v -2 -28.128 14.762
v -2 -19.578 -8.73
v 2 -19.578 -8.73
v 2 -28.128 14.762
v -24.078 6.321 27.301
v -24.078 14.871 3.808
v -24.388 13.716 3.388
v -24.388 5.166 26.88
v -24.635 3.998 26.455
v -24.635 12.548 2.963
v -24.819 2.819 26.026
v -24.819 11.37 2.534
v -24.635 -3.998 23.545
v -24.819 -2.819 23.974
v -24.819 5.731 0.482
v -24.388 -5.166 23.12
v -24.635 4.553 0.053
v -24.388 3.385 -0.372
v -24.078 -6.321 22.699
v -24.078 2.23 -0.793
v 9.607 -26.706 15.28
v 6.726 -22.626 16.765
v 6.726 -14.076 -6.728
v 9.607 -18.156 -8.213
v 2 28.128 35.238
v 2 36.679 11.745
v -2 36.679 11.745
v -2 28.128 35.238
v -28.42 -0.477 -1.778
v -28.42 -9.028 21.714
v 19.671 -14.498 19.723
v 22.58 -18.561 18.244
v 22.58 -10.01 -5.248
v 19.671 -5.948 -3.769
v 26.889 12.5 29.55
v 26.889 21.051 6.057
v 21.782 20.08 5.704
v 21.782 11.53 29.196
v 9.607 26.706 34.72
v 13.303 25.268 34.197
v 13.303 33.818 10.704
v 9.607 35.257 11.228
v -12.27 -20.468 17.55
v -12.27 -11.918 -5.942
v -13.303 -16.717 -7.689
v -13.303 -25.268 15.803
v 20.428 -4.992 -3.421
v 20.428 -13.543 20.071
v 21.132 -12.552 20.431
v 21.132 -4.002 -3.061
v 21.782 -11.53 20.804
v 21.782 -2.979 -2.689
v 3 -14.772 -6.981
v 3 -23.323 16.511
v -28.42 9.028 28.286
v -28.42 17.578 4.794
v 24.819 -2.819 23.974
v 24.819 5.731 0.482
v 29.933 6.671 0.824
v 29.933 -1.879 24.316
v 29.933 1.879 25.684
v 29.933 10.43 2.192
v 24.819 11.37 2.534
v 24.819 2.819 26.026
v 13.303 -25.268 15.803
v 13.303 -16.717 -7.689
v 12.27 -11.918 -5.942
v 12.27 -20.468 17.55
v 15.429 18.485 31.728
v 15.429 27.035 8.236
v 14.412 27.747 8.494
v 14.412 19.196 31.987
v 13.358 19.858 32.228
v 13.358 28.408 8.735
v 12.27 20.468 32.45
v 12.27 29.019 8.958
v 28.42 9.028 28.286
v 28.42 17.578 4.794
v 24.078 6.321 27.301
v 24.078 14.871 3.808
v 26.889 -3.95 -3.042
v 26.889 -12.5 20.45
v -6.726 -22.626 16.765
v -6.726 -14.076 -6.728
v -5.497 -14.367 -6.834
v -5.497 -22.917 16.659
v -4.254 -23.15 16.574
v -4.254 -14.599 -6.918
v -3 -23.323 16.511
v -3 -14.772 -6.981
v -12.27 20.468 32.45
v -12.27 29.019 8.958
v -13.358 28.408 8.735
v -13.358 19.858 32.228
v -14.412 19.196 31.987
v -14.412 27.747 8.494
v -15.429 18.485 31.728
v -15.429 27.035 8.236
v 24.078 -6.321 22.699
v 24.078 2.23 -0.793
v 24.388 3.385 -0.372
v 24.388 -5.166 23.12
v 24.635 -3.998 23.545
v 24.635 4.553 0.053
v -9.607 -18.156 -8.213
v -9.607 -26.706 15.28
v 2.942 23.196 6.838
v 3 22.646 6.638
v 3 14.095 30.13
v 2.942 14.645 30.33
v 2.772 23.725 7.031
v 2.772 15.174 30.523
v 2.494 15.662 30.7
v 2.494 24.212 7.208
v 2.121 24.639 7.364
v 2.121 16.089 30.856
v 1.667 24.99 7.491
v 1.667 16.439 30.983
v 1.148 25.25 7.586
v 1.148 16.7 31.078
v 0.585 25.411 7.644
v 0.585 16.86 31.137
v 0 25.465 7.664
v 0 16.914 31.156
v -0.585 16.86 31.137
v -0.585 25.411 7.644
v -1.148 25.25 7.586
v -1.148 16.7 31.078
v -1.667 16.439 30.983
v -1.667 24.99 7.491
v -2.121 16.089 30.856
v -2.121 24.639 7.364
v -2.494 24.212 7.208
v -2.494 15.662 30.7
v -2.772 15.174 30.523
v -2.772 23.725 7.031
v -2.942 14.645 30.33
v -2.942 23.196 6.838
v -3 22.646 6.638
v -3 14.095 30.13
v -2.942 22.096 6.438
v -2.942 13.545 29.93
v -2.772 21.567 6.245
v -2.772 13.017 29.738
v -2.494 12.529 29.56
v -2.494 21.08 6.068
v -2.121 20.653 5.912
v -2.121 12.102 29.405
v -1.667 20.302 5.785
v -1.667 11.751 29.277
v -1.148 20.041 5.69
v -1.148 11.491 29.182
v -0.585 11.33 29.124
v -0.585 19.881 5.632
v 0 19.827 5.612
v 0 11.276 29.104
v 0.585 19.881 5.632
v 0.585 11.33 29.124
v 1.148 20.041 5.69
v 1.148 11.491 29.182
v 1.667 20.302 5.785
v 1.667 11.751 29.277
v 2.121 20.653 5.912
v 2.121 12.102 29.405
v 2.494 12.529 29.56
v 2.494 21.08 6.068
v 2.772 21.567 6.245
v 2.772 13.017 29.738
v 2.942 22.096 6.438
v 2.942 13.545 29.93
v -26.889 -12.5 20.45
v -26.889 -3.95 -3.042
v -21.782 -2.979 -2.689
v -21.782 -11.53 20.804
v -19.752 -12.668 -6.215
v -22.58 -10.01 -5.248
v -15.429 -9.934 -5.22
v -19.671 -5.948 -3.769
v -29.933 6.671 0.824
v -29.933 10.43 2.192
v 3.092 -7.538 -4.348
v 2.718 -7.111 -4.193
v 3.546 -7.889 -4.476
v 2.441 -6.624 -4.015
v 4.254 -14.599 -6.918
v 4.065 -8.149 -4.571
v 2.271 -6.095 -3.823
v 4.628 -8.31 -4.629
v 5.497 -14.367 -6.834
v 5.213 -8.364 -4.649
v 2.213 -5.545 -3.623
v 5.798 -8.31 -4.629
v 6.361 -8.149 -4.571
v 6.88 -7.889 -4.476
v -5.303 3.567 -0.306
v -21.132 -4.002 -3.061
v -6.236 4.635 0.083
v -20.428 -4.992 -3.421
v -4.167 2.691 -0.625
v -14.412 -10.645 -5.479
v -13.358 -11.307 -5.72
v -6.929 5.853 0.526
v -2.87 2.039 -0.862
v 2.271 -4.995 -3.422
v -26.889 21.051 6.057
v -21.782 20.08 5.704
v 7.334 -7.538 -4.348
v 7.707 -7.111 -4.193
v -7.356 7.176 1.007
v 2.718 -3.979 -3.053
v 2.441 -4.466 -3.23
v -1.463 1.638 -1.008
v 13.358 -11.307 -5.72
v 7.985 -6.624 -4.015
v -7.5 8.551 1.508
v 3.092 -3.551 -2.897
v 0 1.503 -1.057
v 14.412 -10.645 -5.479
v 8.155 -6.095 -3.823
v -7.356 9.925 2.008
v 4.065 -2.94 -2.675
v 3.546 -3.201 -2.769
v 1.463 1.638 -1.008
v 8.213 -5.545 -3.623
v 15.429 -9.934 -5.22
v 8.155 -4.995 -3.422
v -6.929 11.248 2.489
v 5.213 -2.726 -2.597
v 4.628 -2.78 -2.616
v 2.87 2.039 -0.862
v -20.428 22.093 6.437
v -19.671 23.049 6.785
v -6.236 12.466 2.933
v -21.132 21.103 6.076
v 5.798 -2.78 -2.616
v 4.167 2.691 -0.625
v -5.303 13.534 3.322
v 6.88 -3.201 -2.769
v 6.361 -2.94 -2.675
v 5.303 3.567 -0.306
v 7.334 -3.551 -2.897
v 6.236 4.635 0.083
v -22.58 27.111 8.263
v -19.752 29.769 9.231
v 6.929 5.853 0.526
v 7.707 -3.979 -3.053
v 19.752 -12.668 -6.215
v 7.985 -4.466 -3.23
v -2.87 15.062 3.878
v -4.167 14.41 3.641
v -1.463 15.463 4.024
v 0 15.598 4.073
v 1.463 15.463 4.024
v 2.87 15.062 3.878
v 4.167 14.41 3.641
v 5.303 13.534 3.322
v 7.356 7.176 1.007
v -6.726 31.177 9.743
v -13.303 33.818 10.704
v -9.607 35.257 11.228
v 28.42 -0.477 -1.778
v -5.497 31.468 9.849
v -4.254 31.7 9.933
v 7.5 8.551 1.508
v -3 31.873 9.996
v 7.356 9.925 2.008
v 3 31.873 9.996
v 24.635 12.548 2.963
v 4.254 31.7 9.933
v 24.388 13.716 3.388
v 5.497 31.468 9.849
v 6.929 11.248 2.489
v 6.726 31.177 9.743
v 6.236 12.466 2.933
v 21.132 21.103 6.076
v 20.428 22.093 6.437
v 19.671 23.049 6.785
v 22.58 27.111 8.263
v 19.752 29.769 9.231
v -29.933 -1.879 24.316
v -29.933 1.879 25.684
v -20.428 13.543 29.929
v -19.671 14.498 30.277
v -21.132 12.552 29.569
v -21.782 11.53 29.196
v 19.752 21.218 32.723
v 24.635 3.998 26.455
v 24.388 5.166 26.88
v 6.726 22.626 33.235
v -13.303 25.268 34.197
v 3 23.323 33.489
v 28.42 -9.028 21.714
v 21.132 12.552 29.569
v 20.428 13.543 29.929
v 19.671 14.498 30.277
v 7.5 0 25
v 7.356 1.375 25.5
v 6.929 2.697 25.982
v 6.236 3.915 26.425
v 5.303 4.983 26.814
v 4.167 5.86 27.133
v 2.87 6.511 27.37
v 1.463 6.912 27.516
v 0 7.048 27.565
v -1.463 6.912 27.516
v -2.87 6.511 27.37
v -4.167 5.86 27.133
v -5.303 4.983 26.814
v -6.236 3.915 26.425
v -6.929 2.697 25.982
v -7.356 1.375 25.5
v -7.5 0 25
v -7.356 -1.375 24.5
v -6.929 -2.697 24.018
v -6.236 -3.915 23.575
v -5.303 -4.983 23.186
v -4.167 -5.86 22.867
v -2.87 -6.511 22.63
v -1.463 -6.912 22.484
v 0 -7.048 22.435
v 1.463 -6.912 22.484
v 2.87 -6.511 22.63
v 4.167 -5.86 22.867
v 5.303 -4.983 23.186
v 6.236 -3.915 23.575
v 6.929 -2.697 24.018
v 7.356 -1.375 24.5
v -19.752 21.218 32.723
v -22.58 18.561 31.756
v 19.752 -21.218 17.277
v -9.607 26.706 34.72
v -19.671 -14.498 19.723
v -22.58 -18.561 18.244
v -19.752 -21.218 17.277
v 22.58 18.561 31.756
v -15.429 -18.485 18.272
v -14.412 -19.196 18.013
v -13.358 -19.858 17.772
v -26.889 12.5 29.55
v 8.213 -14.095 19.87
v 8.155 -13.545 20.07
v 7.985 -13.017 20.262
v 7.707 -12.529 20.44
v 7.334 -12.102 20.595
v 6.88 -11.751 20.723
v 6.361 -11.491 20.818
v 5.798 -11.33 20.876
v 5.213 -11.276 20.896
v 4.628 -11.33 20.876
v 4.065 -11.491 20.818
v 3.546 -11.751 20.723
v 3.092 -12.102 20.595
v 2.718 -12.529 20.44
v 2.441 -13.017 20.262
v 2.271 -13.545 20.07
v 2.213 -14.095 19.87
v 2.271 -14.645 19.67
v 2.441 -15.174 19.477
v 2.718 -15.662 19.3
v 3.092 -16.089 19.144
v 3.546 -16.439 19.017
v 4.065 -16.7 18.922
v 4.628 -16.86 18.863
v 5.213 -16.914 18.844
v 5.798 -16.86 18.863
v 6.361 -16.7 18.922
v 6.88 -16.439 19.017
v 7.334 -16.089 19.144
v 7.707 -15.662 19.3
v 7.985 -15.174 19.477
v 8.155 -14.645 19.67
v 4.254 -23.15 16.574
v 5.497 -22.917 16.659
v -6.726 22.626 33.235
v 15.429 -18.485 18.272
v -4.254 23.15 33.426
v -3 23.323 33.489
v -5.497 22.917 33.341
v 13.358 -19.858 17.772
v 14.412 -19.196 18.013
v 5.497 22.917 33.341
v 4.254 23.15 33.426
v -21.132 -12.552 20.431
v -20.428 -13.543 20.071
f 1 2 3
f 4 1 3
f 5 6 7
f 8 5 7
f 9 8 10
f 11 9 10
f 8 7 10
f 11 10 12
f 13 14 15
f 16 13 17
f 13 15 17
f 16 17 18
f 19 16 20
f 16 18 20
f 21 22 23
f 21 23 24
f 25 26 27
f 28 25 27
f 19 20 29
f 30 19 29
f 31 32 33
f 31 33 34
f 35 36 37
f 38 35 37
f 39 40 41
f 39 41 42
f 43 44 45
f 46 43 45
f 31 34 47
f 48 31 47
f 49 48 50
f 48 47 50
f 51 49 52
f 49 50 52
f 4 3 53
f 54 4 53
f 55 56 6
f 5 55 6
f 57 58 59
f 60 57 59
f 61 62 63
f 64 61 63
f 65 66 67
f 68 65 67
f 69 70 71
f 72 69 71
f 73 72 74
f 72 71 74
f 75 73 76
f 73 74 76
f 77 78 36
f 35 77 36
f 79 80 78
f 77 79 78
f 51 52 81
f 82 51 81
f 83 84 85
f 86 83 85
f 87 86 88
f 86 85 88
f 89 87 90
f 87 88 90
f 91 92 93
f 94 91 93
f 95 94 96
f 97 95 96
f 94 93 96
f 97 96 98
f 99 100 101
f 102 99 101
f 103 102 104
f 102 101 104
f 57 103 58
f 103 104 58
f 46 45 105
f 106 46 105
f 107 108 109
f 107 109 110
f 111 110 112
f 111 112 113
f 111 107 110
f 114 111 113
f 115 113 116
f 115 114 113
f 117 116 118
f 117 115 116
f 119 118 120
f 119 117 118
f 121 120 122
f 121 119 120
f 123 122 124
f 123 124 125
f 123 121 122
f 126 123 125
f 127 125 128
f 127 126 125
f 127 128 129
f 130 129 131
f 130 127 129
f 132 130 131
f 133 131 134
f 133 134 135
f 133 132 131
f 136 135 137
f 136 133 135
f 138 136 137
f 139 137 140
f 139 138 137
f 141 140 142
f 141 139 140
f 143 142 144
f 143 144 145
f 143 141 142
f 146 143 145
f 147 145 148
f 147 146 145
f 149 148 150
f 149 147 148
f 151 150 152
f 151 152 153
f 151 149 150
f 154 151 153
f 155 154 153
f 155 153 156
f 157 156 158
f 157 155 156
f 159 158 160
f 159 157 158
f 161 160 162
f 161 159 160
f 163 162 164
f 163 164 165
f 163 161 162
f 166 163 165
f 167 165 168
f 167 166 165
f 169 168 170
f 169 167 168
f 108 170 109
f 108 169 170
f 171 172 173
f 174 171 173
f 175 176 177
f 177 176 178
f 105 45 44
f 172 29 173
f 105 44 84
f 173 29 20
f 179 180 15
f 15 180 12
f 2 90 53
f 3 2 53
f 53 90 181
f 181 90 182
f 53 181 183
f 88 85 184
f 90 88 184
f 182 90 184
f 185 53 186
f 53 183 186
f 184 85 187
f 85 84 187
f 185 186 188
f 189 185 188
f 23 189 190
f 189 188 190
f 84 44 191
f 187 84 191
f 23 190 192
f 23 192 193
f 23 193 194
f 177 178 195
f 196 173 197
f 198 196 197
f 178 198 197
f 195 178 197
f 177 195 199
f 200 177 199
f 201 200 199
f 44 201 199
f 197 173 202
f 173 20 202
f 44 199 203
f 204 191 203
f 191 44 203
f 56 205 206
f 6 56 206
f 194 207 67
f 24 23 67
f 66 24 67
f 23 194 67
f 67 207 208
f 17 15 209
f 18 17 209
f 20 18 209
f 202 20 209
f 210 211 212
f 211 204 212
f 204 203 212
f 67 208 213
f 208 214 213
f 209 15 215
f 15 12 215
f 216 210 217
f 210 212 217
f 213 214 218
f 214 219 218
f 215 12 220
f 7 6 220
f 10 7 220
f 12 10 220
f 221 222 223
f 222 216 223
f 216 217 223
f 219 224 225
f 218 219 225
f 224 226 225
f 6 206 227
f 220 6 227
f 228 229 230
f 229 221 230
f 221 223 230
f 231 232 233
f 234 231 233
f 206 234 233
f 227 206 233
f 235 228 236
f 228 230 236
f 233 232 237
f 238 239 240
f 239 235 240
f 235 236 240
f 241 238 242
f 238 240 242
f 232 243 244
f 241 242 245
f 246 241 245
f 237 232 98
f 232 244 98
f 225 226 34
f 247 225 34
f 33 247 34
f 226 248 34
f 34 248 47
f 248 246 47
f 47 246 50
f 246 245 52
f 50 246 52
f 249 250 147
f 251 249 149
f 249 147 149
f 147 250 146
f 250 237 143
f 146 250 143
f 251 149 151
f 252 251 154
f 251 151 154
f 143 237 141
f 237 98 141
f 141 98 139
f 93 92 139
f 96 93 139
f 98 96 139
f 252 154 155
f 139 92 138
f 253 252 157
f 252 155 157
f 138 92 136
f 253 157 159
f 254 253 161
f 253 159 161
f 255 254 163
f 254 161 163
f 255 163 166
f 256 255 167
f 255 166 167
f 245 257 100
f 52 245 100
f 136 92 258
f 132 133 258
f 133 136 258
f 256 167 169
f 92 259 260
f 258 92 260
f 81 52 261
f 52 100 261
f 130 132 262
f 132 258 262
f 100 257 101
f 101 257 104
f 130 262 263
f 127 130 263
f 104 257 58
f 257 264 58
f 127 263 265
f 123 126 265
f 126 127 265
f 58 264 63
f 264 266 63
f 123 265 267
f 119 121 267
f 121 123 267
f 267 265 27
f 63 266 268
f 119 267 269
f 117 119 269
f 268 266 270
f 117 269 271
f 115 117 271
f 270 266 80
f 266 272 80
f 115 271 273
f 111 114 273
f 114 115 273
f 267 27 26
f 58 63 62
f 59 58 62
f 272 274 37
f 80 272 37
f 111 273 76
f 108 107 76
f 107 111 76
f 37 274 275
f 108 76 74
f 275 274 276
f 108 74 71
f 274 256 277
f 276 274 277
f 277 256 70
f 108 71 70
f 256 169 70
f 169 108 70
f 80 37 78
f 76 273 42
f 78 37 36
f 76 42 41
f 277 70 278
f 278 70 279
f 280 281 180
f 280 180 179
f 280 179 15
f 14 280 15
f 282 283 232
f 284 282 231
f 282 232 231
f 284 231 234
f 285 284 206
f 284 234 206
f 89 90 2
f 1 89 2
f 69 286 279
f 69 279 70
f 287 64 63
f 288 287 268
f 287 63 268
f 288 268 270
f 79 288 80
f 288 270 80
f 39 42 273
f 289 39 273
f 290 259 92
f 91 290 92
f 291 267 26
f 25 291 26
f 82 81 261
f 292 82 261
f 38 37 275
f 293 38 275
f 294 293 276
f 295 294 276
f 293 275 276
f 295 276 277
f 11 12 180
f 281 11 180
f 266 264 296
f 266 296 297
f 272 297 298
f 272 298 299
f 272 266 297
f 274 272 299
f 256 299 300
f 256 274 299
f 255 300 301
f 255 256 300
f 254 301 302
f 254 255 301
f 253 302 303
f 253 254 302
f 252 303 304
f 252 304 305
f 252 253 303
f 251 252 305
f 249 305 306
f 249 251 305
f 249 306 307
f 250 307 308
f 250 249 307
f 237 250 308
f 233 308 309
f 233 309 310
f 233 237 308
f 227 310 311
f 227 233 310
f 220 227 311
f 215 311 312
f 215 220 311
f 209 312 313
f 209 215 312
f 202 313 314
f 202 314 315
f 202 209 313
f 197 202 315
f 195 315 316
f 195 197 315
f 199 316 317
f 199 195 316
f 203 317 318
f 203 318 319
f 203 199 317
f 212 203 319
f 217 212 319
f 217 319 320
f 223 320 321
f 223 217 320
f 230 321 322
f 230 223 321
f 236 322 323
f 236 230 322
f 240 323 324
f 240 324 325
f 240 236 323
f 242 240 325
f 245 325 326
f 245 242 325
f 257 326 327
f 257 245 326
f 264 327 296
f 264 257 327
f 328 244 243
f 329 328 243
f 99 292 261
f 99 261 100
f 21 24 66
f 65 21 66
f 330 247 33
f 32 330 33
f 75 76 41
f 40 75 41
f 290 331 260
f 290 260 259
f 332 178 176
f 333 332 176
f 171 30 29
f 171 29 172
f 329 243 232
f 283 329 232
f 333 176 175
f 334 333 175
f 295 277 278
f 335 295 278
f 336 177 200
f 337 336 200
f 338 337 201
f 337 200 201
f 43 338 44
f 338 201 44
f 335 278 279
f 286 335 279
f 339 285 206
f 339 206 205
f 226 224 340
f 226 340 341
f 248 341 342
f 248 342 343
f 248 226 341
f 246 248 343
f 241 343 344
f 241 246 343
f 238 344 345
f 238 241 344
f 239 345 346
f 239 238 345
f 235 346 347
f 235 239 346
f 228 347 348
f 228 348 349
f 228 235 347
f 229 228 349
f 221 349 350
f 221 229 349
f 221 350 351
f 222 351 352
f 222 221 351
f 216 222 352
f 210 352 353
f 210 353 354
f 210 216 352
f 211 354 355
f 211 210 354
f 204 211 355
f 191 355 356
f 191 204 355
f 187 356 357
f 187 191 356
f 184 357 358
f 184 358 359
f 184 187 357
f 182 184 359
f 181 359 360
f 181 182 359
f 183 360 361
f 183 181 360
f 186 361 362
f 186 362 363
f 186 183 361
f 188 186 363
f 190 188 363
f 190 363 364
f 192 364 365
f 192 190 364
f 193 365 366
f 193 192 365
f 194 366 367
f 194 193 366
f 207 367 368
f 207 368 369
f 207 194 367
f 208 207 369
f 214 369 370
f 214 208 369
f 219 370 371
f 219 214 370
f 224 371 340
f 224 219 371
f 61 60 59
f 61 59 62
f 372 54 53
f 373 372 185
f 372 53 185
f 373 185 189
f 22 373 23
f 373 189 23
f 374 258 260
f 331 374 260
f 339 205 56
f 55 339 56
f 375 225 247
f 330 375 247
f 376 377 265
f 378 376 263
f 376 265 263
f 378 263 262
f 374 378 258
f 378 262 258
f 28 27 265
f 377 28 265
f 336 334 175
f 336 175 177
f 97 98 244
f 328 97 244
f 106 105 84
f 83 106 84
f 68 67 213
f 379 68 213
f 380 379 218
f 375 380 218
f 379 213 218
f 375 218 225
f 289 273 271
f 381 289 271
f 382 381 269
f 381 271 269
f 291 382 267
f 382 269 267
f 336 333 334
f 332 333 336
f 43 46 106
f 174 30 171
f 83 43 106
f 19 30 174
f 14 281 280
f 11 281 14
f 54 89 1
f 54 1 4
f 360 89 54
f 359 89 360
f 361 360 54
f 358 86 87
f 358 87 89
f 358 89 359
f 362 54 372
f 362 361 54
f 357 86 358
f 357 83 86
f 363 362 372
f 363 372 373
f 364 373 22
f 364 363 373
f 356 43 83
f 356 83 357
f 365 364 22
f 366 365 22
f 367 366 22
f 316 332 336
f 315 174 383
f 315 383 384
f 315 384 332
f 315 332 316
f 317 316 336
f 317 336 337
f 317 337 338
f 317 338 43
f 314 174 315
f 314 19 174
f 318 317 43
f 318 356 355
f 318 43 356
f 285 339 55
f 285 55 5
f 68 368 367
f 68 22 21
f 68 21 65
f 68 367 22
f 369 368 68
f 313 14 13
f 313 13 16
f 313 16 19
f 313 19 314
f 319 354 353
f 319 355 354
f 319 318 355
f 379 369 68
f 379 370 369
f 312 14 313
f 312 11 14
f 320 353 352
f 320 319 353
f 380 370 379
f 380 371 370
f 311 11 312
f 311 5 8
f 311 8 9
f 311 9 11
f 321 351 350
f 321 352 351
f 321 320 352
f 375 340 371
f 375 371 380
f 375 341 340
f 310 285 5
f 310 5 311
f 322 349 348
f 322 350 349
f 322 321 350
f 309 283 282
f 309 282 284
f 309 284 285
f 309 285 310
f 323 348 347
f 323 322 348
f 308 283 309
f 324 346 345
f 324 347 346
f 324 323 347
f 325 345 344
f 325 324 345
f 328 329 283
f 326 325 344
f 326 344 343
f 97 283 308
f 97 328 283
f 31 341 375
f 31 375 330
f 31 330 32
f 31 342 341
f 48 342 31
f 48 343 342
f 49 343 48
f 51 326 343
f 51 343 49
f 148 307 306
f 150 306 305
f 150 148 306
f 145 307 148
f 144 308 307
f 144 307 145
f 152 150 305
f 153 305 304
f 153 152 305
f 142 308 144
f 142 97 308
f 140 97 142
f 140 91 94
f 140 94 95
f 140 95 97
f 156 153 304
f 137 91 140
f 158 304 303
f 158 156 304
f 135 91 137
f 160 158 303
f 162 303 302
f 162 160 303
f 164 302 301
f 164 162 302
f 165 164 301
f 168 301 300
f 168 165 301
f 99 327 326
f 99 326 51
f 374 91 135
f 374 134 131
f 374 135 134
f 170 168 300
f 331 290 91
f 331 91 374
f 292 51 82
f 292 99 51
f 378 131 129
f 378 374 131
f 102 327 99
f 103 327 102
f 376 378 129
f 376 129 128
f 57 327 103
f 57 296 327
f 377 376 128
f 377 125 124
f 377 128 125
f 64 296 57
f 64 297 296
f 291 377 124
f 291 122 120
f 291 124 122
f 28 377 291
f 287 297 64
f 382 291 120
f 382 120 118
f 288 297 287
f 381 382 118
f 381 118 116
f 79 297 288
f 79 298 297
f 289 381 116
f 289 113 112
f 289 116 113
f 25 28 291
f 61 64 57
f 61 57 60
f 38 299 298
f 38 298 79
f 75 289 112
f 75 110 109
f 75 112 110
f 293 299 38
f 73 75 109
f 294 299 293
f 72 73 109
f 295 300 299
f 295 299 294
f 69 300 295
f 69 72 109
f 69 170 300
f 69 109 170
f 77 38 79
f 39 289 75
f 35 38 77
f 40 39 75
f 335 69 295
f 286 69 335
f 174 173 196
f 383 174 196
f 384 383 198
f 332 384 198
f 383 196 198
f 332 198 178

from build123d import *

# Parameters (mm, degrees)
F0_R     = 3
F0_R_2   = 7.5
F1_DEPTH = 25
F3_ANGLE = 20


with BuildPart() as f1:
    # F0 (on Top) → F1 (new body)
    with BuildSketch(Plane.XY):
        with BuildLine():
            Line((3, 24.819347), (2, 29.933259))
            Line((2, 29.933259), (-2, 29.933259))
            Line((-2, 29.933259), (-3, 24.819347))
            ThreePointArc((-3, 24.819347), (-4.877258, 24.519632), (-6.726314, 24.078137))
            Line((-6.726314, 24.078137), (-9.607203, 28.420092))
            Line((-9.607203, 28.420092), (-13.302721, 26.889359))
            Line((-13.302721, 26.889359), (-12.269592, 21.782037))
            ThreePointArc((-12.269592, 21.782037), (-13.889256, 20.78674), (-15.428608, 19.671249))
            Line((-15.428608, 19.671249), (-19.751797, 22.580224))
            Line((-19.751797, 22.580224), (-22.580224, 19.751797))
            Line((-22.580224, 19.751797), (-19.671249, 15.428609))
            ThreePointArc((-19.671249, 15.428609), (-20.78674, 13.889256), (-21.782037, 12.269592))
            Line((-21.782037, 12.269592), (-26.889359, 13.302722))
            Line((-26.889359, 13.302722), (-28.420092, 9.607203))
            Line((-28.420092, 9.607203), (-24.078137, 6.726315))
            ThreePointArc((-24.078137, 6.726315), (-24.519632, 4.877258), (-24.819347, 3))
            Line((-24.819347, 3), (-29.933259, 2))
            Line((-29.933259, 2), (-29.933259, -2))
            Line((-29.933259, -2), (-24.819347, -3))
            ThreePointArc((-24.819347, -3), (-24.519632, -4.877258), (-24.078137, -6.726314))
            Line((-24.078137, -6.726314), (-28.420092, -9.607203))
            Line((-28.420092, -9.607203), (-26.889359, -13.302721))
            Line((-26.889359, -13.302721), (-21.782037, -12.269592))
            ThreePointArc((-21.782037, -12.269592), (-20.78674, -13.889256), (-19.671249, -15.428608))
            Line((-19.671249, -15.428608), (-22.580224, -19.751797))
            Line((-22.580224, -19.751797), (-19.751797, -22.580224))
            Line((-19.751797, -22.580224), (-15.428608, -19.671249))
            ThreePointArc((-15.428608, -19.671249), (-13.889256, -20.78674), (-12.269592, -21.782037))
            Line((-12.269592, -21.782037), (-13.302721, -26.889359))
            Line((-13.302721, -26.889359), (-9.607203, -28.420092))
            Line((-9.607203, -28.420092), (-6.726314, -24.078137))
            ThreePointArc((-6.726314, -24.078137), (-4.877258, -24.519632), (-3, -24.819347))
            Line((-3, -24.819347), (-2, -29.933259))
            Line((-2, -29.933259), (2, -29.933259))
            Line((2, -29.933259), (3, -24.819347))
            ThreePointArc((3, -24.819347), (4.877258, -24.519632), (6.726314, -24.078137))
            Line((6.726314, -24.078137), (9.607203, -28.420092))
            Line((9.607203, -28.420092), (13.302721, -26.889359))
            Line((13.302721, -26.889359), (12.269592, -21.782037))
            ThreePointArc((12.269592, -21.782037), (13.889256, -20.78674), (15.428608, -19.671249))
            Line((15.428608, -19.671249), (19.751797, -22.580224))
            Line((19.751797, -22.580224), (22.580224, -19.751797))
            Line((22.580224, -19.751797), (19.671249, -15.428608))
            ThreePointArc((19.671249, -15.428608), (20.78674, -13.889256), (21.782037, -12.269592))
            Line((21.782037, -12.269592), (26.889359, -13.302721))
            Line((26.889359, -13.302721), (28.420092, -9.607203))
            Line((28.420092, -9.607203), (24.078137, -6.726314))
            ThreePointArc((24.078137, -6.726314), (24.519632, -4.877258), (24.819347, -3))
            Line((24.819347, -3), (29.933259, -2))
            Line((29.933259, -2), (29.933259, 2))
            Line((29.933259, 2), (24.819347, 3))
            ThreePointArc((24.819347, 3), (24.519632, 4.877258), (24.078137, 6.726314))
            Line((24.078137, 6.726314), (28.420092, 9.607203))
            Line((28.420092, 9.607203), (26.889359, 13.302721))
            Line((26.889359, 13.302721), (21.782037, 12.269592))
            ThreePointArc((21.782037, 12.269592), (20.78674, 13.889256), (19.671249, 15.428608))
            Line((19.671249, 15.428608), (22.580224, 19.751797))
            Line((22.580224, 19.751797), (19.751797, 22.580224))
            Line((19.751797, 22.580224), (15.428608, 19.671249))
            ThreePointArc((15.428608, 19.671249), (13.889256, 20.78674), (12.269592, 21.782037))
            Line((12.269592, 21.782037), (13.302721, 26.889359))
            Line((13.302721, 26.889359), (9.607203, 28.420092))
            Line((9.607203, 28.420092), (6.726314, 24.078137))
            ThreePointArc((6.726314, 24.078137), (4.877258, 24.519632), (3, 24.819347))
        make_face()
        with Locations((5.212864, -15)):
            Circle(F0_R, mode=Mode.SUBTRACT)
        Circle(F0_R_2, mode=Mode.SUBTRACT)
        with Locations((0, 15)):
            Circle(F0_R, mode=Mode.SUBTRACT)
    extrude(amount=F1_DEPTH)


with BuildPart() as f1_1:
    # F3: moved
    add(f1.part.rotate(Axis((0.748886, 0, 25), (1, 0, 0)), F3_ANGLE))


solid = f1_1.part
